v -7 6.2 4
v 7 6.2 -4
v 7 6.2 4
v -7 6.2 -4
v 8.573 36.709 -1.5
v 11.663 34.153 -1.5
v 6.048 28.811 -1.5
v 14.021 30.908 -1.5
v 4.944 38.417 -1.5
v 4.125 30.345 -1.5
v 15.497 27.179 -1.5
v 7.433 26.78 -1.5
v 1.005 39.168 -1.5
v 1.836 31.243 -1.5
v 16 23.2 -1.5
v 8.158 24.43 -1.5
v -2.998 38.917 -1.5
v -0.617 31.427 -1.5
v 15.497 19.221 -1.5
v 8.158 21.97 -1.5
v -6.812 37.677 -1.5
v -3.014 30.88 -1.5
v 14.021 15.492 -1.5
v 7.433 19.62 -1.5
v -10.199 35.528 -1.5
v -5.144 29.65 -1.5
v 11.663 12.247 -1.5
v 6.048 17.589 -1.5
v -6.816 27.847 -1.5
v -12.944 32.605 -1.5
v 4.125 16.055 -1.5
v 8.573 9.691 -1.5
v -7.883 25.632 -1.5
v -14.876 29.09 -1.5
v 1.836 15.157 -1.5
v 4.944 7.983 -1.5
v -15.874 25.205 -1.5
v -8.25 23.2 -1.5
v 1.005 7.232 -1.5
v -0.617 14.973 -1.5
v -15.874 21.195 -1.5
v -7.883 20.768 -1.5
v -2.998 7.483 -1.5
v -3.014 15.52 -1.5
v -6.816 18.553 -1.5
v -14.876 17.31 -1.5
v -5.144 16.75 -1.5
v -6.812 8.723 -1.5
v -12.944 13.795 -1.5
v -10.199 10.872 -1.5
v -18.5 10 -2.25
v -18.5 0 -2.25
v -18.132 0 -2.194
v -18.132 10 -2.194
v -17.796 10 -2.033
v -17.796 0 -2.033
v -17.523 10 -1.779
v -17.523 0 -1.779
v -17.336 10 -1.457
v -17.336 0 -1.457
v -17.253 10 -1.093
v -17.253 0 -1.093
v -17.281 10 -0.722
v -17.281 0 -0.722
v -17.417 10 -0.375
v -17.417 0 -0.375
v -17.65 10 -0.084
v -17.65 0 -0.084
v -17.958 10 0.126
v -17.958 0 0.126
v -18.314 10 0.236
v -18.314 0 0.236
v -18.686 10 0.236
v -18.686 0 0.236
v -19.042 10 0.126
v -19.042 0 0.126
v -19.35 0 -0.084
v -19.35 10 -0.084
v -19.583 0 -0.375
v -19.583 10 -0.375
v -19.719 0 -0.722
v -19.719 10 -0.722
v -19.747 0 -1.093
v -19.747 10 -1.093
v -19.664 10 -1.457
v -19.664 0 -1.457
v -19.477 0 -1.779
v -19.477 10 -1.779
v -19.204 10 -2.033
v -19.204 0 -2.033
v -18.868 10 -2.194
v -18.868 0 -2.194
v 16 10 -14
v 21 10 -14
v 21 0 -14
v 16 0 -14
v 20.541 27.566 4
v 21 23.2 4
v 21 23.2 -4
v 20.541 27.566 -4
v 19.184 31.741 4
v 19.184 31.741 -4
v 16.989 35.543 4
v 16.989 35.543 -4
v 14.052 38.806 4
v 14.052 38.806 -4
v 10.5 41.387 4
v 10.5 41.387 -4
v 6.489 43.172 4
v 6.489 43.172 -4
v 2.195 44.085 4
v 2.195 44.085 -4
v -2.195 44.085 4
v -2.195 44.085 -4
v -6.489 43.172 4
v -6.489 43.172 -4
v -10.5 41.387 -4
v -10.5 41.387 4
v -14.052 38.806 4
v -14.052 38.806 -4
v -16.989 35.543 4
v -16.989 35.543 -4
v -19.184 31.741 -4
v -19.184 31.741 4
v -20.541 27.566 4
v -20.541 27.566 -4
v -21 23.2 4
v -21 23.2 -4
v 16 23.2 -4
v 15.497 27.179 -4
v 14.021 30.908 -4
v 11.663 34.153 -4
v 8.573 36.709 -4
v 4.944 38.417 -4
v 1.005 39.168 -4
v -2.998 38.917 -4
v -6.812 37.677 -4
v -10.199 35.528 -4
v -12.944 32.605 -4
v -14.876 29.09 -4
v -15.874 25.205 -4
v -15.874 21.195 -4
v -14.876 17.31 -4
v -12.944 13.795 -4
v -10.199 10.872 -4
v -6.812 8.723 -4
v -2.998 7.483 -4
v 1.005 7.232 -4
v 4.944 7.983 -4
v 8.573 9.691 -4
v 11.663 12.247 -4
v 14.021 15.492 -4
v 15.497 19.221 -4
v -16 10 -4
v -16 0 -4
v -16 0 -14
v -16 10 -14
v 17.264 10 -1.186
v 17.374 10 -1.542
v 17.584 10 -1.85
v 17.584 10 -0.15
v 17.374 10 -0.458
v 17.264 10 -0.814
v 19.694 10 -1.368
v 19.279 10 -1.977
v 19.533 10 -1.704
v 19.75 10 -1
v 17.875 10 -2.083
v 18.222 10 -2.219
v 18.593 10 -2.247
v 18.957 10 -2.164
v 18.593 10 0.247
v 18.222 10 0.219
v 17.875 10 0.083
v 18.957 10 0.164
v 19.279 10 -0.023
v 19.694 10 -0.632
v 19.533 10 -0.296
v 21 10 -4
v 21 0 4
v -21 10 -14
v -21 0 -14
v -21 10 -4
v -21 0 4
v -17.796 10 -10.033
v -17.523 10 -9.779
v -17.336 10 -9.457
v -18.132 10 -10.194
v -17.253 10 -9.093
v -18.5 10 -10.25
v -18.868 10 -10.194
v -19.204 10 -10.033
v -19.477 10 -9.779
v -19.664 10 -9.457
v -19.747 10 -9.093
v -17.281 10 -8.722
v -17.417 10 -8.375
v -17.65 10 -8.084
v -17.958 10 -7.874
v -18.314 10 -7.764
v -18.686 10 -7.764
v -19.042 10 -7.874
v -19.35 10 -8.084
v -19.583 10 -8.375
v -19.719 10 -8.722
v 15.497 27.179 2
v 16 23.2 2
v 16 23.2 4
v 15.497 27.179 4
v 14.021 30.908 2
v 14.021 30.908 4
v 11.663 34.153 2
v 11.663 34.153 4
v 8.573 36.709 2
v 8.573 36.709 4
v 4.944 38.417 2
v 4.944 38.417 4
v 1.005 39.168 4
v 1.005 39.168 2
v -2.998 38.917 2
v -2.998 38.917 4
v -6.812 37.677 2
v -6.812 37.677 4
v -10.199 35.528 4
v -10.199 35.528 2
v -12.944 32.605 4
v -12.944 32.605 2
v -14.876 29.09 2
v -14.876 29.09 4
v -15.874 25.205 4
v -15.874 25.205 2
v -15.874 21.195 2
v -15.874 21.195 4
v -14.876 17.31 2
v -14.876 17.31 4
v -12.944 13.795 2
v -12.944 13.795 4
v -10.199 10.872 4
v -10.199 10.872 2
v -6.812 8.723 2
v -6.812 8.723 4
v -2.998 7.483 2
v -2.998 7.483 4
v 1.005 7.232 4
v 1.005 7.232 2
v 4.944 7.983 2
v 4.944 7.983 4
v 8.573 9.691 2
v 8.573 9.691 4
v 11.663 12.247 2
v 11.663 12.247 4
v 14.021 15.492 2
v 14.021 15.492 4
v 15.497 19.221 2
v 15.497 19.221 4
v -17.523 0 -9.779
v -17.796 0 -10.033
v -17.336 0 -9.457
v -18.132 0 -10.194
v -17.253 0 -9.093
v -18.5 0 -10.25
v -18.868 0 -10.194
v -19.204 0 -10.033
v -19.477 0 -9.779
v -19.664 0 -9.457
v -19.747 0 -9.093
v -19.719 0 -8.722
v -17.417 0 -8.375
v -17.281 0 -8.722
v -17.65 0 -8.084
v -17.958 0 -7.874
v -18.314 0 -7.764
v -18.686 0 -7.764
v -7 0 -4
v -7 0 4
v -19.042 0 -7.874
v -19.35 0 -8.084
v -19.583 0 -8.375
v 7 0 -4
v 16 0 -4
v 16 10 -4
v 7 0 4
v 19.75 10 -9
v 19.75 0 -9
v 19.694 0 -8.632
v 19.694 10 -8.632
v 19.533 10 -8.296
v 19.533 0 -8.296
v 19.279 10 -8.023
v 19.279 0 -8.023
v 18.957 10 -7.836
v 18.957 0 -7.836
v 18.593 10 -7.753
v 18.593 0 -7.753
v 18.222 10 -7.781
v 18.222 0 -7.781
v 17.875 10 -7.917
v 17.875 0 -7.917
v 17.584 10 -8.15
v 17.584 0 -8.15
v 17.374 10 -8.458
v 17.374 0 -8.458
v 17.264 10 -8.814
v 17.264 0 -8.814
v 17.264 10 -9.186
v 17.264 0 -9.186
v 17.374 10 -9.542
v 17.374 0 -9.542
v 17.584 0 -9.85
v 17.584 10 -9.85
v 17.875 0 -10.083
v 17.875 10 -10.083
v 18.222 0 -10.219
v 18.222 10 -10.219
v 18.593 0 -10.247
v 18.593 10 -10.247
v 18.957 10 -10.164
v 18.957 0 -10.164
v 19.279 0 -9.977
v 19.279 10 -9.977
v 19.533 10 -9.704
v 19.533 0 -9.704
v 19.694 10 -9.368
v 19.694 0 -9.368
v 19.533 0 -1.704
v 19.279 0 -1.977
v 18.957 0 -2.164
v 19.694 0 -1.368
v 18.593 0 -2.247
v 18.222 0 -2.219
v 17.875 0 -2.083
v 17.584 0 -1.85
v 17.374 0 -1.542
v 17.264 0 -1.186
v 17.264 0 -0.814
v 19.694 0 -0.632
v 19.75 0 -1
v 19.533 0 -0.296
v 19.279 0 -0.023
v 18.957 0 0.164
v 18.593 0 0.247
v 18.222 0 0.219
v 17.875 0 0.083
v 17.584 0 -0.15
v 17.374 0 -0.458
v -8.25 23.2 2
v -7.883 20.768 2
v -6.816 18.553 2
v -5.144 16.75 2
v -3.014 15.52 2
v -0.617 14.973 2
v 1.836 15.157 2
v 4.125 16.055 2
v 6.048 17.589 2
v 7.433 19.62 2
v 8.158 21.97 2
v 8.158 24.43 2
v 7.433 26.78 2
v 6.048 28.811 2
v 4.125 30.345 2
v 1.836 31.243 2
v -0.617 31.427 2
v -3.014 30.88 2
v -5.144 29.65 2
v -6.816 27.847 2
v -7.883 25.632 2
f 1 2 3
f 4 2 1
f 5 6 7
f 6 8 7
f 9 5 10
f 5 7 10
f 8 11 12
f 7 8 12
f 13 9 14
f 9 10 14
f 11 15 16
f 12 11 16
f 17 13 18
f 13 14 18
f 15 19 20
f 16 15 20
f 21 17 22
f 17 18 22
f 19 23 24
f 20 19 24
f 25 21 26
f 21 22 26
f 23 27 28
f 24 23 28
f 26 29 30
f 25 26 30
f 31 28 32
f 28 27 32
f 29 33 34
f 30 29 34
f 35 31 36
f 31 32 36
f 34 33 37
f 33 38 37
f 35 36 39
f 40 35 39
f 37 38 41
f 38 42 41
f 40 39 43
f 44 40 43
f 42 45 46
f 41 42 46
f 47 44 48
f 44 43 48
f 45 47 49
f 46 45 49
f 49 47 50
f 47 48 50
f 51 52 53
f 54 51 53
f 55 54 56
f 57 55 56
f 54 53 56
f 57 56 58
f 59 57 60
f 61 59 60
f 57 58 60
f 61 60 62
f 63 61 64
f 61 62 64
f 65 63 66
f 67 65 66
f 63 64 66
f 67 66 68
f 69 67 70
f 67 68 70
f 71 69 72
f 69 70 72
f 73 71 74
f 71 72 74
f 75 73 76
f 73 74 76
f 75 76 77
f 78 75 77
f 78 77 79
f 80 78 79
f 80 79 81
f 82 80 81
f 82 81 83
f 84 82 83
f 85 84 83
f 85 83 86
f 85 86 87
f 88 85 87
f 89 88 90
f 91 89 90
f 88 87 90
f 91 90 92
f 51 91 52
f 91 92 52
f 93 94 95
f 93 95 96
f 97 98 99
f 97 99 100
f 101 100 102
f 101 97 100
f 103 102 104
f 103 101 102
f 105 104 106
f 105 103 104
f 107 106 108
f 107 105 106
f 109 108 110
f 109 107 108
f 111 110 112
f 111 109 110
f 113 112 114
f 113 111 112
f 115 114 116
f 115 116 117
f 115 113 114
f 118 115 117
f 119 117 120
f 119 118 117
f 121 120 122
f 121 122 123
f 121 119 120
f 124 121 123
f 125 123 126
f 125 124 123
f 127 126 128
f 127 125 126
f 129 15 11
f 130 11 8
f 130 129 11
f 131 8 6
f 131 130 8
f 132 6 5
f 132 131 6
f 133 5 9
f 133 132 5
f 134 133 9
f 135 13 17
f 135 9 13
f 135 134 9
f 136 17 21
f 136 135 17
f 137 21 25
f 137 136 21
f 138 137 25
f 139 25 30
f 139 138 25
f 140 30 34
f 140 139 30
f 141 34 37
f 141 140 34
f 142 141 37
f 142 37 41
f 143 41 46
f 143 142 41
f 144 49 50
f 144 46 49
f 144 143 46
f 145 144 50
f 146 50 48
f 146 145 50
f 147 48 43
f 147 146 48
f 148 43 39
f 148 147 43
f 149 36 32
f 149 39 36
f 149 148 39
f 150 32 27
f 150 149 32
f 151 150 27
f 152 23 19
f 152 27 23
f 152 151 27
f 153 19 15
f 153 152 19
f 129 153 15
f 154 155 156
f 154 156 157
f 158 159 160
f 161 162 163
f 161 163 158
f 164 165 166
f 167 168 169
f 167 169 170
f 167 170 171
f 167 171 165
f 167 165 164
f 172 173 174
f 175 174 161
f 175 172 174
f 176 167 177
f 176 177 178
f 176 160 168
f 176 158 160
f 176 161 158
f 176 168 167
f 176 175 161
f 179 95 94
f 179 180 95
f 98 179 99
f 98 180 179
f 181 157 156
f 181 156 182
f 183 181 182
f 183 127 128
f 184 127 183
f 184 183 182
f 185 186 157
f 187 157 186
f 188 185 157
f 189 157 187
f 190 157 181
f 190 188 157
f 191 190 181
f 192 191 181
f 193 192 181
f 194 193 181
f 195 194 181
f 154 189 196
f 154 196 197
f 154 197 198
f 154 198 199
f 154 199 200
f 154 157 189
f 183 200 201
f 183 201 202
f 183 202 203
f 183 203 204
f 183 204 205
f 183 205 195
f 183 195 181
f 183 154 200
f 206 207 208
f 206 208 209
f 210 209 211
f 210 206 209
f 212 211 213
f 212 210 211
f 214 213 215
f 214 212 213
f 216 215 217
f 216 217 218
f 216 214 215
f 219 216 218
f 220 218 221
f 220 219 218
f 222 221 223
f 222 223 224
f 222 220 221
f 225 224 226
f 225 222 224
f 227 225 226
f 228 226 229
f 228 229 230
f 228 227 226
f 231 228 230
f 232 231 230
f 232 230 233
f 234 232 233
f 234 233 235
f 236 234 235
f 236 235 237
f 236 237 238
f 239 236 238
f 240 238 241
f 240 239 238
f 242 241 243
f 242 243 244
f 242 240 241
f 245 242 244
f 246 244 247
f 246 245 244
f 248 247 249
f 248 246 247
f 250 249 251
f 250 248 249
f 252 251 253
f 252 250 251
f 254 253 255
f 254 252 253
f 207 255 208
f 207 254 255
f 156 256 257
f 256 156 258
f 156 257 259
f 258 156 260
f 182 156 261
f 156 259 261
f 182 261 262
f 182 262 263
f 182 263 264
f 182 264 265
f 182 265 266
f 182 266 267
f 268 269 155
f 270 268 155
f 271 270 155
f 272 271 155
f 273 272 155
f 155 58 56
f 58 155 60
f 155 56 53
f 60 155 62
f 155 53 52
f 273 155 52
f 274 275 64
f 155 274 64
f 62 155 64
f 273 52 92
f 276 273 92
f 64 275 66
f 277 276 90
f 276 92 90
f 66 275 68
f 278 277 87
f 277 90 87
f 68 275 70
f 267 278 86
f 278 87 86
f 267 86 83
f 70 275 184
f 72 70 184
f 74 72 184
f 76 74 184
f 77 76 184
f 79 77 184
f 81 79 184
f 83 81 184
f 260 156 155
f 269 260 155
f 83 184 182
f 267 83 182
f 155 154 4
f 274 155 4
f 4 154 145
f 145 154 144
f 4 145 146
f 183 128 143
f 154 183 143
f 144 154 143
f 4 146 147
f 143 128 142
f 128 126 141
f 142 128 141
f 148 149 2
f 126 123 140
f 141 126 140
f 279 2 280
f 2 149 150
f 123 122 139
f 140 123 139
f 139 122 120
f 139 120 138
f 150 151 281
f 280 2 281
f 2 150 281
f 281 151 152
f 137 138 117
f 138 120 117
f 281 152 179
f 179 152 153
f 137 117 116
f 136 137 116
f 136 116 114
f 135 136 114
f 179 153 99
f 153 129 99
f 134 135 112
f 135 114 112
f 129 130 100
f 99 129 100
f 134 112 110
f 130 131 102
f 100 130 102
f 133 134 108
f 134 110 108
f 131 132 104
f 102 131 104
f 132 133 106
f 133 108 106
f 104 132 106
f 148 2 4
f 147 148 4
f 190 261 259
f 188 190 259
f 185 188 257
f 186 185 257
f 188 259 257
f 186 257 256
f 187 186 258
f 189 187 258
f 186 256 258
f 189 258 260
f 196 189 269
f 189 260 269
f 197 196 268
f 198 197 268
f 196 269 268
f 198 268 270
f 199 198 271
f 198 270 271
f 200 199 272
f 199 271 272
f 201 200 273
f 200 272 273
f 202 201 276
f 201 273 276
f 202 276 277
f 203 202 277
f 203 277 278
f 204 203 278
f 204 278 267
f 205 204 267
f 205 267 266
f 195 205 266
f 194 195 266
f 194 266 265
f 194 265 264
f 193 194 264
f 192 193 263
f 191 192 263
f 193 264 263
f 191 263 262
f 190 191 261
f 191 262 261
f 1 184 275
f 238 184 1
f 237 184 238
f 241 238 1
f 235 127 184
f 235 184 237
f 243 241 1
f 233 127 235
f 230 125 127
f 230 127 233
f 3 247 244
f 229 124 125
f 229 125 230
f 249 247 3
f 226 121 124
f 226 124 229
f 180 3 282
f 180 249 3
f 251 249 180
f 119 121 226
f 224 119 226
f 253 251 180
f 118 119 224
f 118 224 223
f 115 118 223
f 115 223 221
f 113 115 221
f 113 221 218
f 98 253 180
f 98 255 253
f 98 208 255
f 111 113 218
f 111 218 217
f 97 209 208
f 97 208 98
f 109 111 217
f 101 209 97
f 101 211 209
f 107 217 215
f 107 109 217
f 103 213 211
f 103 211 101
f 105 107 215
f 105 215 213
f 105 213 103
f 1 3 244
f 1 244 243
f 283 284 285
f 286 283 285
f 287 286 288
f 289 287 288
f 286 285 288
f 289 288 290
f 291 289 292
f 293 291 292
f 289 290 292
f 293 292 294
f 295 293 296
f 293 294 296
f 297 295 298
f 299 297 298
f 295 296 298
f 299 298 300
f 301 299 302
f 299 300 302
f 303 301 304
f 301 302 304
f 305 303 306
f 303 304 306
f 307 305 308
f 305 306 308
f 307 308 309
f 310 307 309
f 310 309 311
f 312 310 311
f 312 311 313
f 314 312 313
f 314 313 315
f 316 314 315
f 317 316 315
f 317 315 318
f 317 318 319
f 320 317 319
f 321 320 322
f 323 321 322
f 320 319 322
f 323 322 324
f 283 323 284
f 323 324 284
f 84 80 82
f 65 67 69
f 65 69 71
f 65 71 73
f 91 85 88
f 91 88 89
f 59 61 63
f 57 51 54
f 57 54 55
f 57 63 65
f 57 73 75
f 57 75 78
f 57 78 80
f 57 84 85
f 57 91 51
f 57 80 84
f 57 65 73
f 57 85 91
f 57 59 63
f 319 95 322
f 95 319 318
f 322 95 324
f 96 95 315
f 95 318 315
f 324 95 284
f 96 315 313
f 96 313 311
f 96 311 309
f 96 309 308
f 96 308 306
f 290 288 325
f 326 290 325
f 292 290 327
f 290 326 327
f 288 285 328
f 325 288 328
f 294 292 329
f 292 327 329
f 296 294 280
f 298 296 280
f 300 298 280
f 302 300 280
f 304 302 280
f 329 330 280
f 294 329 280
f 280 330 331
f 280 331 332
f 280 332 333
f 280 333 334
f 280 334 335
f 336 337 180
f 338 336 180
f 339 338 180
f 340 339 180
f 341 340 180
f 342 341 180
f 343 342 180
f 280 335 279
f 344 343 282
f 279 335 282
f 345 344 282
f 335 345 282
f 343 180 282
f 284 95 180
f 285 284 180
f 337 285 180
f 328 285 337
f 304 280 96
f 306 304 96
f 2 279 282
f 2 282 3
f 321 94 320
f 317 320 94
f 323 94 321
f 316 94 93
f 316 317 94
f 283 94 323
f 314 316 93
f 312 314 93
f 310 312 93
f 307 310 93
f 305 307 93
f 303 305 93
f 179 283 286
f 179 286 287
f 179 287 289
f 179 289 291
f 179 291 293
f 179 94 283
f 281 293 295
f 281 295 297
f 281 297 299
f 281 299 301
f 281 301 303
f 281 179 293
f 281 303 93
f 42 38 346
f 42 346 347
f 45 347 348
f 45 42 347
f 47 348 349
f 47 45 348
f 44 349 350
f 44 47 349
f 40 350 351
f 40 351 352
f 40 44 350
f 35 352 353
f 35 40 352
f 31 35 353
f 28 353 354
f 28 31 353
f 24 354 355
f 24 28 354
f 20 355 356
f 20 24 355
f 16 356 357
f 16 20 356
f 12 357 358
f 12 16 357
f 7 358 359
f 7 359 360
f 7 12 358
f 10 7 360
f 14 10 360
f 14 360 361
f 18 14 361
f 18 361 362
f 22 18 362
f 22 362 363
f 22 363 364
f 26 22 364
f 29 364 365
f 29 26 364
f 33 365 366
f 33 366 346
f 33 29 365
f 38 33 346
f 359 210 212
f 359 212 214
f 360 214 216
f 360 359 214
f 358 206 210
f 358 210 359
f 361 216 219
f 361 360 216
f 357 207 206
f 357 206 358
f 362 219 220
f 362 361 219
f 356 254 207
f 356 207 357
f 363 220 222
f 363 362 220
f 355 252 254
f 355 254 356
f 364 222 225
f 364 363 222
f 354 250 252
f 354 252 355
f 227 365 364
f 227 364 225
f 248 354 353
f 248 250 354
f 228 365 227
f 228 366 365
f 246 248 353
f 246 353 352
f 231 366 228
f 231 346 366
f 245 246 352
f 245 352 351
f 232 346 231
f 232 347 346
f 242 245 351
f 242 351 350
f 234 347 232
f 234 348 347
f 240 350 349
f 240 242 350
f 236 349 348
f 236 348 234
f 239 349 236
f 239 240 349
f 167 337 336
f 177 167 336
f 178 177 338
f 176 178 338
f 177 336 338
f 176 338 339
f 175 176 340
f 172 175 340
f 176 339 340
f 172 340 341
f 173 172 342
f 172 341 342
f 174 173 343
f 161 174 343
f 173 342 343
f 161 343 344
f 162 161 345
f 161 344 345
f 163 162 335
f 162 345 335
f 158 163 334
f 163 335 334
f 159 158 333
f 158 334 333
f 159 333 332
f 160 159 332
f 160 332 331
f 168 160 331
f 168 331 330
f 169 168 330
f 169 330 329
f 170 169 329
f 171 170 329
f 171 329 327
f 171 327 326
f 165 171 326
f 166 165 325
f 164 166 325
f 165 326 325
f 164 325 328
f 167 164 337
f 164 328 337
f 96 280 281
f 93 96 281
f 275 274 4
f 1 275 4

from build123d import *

# Parameters (mm, degrees)
SKETCH2_R                = 16
BOSS_EXTRUDE1_DEPTH      = 4
BOSS_EXTRUDE2_DEPTH      = 2
BOSS_EXTRUDE2_DEPTH_BACK = 1.5
SKETCH3_R                = 16
SKETCH3_R_2              = 8.25
SKETCH6_W                = 5
SKETCH6_H                = 10
BOSS_EXTRUDE4_DEPTH      = 10
SKETCH7_R                = 1.25
CUT_EXTRUDE2_DEPTH       = 10
SKETCH8_W                = 14
SKETCH8_H                = 12.4
CUT_EXTRUDE3_DEPTH       = 50.94637124


with BuildPart() as part:
    # Sketch2 → Boss-Extrude1 (new, symmetric)
    with BuildSketch(Plane.XY):
        with BuildLine():
            Line((-21, 0), (21, 0))
            Line((21, 0), (21, 23.2))
            ThreePointArc((21, 23.2), (0, 44.2), (-21, 23.2))
            Line((-21, 23.2), (-21, 0))
        make_face()
        with Locations((0, 23.2)):
            Circle(SKETCH2_R, mode=Mode.SUBTRACT)
    extrude(amount=BOSS_EXTRUDE1_DEPTH, both=True)

    # Sketch3 → Boss-Extrude2 (add, two sides: drawn at the far end of the back side and taken through both)
    with BuildSketch(Plane.XY.offset(-BOSS_EXTRUDE2_DEPTH_BACK)):
        with Locations(Location((0, 23.2, 0), (0, 0, 180))):
            Circle(SKETCH3_R)
        with Locations(Location((0, 23.2, 0), (0, 0, 180))):
            Circle(SKETCH3_R_2, mode=Mode.SUBTRACT)
    extrude(amount=BOSS_EXTRUDE2_DEPTH + BOSS_EXTRUDE2_DEPTH_BACK)

    # Sketch6 → Boss-Extrude4 (add)
    with BuildSketch(Plane(origin=(0, 0, -4), x_dir=(-1, 0, 0), z_dir=(0, 0, -1))):
        with Locations((-18.5, 5)):
            Rectangle(SKETCH6_W, SKETCH6_H)
        with Locations((18.5, 5)):
            Rectangle(SKETCH6_W, SKETCH6_H)
    extrude(amount=BOSS_EXTRUDE4_DEPTH)

    # Sketch7 → Cut-Extrude2 (cut)
    with BuildSketch(Plane.XZ):
        with Locations(Location((-18.5, -9, 0), (0, 0, 270))):
            Circle(SKETCH7_R)
        with Locations((18.5, -9)):
            Circle(SKETCH7_R)
        with Locations(Location((-18.5, -1, 0), (0, 0, 270))):
            Circle(SKETCH7_R)
        with Locations((18.5, -1)):
            Circle(SKETCH7_R)
    extrude(amount=-CUT_EXTRUDE2_DEPTH, mode=Mode.SUBTRACT)

    # Sketch8 → Cut-Extrude3 (cut, through all)
    with BuildSketch(Plane(origin=(0, 0, -4), x_dir=(-1, 0, 0), z_dir=(0, 0, -1))):
        Rectangle(SKETCH8_W, SKETCH8_H)
    extrude(amount=-CUT_EXTRUDE3_DEPTH, mode=Mode.SUBTRACT)


solid = part.part
